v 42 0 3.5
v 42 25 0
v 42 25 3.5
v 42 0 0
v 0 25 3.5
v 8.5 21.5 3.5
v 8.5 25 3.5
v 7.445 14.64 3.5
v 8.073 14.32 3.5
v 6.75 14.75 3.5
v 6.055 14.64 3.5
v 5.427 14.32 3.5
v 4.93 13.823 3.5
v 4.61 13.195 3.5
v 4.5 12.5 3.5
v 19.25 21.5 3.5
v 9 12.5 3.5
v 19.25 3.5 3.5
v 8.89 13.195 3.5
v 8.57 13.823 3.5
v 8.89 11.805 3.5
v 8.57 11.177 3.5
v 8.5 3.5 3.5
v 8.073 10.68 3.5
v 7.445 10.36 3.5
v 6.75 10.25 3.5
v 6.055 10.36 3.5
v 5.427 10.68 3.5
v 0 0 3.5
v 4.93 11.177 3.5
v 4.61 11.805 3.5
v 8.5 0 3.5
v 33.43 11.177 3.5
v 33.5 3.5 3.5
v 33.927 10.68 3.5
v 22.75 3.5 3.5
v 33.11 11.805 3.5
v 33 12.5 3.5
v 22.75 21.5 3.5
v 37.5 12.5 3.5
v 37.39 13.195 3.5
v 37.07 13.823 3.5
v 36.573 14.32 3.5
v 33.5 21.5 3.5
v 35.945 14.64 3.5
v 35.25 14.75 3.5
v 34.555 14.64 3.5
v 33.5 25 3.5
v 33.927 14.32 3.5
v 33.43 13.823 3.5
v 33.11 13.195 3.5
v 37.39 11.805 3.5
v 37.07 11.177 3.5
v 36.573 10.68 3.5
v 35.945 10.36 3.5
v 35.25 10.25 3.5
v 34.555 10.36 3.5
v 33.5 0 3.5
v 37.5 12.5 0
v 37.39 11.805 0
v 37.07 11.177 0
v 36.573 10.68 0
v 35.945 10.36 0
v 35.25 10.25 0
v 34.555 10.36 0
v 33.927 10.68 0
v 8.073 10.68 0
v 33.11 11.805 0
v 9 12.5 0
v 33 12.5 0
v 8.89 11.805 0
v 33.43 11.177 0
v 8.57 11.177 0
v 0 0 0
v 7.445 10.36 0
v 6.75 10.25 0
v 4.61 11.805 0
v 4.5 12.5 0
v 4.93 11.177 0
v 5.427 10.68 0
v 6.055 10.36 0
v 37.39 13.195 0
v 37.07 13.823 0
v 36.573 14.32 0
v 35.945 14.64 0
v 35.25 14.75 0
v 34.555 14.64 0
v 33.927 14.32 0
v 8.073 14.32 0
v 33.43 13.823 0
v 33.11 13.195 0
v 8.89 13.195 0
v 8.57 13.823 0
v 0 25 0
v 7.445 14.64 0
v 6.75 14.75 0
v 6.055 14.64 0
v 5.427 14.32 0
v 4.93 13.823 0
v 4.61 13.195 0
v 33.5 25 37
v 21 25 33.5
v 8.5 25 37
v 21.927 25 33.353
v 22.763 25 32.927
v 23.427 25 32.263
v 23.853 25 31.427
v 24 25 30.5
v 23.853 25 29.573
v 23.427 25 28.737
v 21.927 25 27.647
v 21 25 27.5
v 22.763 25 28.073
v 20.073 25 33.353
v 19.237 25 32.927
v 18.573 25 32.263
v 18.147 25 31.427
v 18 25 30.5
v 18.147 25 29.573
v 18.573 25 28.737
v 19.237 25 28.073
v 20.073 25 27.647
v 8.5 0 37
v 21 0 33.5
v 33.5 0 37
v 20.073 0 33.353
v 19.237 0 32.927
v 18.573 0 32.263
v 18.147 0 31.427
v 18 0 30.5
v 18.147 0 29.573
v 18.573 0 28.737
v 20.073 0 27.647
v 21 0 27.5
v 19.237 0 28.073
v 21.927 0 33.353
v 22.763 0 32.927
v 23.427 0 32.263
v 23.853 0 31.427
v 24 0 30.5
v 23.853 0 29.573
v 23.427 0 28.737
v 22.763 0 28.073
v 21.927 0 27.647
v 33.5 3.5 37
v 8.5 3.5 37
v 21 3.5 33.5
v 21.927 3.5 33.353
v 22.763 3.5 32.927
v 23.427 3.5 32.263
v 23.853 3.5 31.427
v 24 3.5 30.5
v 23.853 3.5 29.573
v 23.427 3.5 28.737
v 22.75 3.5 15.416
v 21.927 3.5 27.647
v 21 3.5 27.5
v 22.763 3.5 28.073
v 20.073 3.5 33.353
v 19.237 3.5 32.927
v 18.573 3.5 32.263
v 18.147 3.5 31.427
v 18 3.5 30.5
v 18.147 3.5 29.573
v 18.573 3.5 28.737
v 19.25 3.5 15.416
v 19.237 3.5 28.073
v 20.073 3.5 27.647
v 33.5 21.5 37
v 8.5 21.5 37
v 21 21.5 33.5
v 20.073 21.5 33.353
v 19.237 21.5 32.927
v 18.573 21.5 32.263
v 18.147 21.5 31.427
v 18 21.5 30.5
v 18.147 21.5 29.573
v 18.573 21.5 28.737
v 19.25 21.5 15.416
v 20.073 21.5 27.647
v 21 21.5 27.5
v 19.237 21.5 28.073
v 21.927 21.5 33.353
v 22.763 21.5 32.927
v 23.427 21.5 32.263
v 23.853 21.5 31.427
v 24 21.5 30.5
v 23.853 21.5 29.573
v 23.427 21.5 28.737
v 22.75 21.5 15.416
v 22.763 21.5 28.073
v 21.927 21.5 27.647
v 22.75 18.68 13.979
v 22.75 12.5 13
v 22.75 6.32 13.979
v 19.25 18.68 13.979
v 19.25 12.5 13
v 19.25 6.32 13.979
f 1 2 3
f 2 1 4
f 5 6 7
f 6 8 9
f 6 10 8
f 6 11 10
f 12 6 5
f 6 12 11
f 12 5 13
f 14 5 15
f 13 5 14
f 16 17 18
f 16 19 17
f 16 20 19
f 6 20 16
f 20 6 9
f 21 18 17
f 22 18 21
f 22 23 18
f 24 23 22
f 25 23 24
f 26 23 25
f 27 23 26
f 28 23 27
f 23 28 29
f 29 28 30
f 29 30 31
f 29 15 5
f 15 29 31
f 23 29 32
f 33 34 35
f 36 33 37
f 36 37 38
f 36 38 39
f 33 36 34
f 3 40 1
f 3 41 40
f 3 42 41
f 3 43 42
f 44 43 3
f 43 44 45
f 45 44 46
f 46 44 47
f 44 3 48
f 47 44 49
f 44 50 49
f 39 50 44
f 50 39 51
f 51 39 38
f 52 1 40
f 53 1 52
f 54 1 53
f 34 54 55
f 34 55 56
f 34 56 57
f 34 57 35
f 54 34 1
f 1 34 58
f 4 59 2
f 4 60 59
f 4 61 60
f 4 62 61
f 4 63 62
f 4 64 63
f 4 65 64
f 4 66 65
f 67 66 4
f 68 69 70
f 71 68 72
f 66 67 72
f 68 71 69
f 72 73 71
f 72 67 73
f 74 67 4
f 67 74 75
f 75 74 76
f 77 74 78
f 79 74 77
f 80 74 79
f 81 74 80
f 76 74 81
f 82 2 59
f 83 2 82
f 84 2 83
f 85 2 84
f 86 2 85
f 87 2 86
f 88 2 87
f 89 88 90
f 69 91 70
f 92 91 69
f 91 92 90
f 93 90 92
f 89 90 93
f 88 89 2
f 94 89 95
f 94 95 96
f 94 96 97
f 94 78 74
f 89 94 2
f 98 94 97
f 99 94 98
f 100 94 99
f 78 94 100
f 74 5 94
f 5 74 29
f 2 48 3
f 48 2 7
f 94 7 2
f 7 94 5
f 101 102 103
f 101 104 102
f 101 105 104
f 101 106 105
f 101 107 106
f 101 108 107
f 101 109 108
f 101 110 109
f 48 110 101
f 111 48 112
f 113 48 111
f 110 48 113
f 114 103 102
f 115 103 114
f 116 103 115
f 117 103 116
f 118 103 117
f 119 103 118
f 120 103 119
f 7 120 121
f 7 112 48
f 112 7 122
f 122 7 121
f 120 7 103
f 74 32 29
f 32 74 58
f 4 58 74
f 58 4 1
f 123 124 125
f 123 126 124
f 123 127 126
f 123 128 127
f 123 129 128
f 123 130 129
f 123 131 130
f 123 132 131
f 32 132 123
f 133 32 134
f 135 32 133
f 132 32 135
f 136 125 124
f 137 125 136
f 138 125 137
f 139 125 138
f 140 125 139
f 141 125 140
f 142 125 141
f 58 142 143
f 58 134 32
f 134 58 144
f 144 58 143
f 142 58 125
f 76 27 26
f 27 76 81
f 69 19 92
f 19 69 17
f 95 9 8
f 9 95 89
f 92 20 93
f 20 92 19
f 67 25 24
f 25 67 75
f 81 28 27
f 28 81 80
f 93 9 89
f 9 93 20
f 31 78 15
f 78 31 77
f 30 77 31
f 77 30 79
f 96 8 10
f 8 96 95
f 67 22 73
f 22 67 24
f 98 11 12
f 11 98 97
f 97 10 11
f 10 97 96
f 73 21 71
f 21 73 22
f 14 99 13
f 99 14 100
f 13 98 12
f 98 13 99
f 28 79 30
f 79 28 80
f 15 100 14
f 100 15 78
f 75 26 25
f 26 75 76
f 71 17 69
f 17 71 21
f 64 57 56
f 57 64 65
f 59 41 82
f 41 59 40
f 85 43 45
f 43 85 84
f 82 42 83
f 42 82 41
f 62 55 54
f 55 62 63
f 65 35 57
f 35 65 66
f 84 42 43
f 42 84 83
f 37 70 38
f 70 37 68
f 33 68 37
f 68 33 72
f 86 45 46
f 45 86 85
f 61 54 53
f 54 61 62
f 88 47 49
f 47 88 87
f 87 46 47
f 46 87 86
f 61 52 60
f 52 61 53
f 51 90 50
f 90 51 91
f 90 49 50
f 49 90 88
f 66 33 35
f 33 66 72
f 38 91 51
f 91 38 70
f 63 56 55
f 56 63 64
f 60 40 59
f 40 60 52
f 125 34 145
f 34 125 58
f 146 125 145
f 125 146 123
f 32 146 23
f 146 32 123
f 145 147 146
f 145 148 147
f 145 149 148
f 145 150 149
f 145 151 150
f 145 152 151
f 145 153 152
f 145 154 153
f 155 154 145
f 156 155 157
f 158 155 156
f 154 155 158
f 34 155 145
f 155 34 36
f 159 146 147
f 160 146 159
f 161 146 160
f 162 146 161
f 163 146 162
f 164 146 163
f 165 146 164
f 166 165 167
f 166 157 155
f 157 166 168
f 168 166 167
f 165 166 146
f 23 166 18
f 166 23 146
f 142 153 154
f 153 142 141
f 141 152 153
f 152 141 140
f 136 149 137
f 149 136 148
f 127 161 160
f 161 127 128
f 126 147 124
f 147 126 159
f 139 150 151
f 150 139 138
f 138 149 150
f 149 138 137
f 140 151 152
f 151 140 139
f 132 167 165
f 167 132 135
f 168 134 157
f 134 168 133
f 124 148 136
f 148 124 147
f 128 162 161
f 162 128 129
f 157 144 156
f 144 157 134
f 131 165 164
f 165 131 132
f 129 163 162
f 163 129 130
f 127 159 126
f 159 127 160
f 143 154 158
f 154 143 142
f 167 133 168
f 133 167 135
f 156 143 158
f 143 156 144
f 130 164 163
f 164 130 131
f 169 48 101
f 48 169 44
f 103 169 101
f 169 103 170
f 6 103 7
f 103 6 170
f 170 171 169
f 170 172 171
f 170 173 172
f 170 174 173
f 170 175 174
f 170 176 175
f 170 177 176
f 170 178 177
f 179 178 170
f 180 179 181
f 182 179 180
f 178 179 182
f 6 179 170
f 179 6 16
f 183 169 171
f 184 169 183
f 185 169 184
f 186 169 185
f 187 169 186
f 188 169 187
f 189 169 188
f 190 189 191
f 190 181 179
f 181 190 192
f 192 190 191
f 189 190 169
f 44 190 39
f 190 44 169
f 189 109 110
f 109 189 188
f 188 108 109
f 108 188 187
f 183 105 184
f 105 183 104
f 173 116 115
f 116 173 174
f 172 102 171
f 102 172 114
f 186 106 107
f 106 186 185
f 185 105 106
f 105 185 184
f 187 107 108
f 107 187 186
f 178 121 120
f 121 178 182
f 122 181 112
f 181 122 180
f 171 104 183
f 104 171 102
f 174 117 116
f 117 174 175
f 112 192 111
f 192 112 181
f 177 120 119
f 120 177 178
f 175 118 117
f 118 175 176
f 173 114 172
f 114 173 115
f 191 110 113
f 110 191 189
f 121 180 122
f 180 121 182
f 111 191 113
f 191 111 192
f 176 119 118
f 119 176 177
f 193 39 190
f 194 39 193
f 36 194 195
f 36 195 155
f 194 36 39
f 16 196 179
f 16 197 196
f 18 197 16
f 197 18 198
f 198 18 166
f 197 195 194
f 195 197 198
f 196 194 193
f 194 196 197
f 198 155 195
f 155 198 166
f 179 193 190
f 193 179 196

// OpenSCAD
$fn = 20;

wall_d = 3.5;

x1 = 42;
y1 = 25;


x2 = 25;
z2 = 37;

cross_h = 15 + wall_d;

arm_offset_x = (x1 - x2)*0.5;

arm_offset_y = (y1 - wall_d);

base_hole_d = 4.5;

top_hole_d = 6;

base_hole_offset = 4.5 + 0.5 * base_hole_d;

top_hole_offset = 27.5 + 0.5 * top_hole_d;

module base() {
  difference() {
    cube([x1, y1, wall_d]);
    translate([base_hole_offset, 0.5*y1, 0]) cylinder(d=base_hole_d, h=wall_d);
    translate([x1-base_hole_offset, 0.5*y1, 0]) cylinder(d=base_hole_d, h=wall_d);
  }

}

module arm() {
    difference() {
      translate([arm_offset_x, 0, 0]) cube([x2, wall_d, z2]);
      translate([0.5 * x1, -wall_d, top_hole_offset]) rotate([-90, 0, 0]) cylinder(d=top_hole_d, h=wall_d*3);
    }
}

module cross_section() {
  translate([0.5*(x1-wall_d), 0, 0]) difference() {
    cube([wall_d, y1, cross_h]);
    translate([0, y1*0.5, 33]) rotate([0, 90, 0]) cylinder(d=40, h=wall_d);
  }
}

base();

arm();
translate([0, arm_offset_y, 0]) arm();

cross_section();
